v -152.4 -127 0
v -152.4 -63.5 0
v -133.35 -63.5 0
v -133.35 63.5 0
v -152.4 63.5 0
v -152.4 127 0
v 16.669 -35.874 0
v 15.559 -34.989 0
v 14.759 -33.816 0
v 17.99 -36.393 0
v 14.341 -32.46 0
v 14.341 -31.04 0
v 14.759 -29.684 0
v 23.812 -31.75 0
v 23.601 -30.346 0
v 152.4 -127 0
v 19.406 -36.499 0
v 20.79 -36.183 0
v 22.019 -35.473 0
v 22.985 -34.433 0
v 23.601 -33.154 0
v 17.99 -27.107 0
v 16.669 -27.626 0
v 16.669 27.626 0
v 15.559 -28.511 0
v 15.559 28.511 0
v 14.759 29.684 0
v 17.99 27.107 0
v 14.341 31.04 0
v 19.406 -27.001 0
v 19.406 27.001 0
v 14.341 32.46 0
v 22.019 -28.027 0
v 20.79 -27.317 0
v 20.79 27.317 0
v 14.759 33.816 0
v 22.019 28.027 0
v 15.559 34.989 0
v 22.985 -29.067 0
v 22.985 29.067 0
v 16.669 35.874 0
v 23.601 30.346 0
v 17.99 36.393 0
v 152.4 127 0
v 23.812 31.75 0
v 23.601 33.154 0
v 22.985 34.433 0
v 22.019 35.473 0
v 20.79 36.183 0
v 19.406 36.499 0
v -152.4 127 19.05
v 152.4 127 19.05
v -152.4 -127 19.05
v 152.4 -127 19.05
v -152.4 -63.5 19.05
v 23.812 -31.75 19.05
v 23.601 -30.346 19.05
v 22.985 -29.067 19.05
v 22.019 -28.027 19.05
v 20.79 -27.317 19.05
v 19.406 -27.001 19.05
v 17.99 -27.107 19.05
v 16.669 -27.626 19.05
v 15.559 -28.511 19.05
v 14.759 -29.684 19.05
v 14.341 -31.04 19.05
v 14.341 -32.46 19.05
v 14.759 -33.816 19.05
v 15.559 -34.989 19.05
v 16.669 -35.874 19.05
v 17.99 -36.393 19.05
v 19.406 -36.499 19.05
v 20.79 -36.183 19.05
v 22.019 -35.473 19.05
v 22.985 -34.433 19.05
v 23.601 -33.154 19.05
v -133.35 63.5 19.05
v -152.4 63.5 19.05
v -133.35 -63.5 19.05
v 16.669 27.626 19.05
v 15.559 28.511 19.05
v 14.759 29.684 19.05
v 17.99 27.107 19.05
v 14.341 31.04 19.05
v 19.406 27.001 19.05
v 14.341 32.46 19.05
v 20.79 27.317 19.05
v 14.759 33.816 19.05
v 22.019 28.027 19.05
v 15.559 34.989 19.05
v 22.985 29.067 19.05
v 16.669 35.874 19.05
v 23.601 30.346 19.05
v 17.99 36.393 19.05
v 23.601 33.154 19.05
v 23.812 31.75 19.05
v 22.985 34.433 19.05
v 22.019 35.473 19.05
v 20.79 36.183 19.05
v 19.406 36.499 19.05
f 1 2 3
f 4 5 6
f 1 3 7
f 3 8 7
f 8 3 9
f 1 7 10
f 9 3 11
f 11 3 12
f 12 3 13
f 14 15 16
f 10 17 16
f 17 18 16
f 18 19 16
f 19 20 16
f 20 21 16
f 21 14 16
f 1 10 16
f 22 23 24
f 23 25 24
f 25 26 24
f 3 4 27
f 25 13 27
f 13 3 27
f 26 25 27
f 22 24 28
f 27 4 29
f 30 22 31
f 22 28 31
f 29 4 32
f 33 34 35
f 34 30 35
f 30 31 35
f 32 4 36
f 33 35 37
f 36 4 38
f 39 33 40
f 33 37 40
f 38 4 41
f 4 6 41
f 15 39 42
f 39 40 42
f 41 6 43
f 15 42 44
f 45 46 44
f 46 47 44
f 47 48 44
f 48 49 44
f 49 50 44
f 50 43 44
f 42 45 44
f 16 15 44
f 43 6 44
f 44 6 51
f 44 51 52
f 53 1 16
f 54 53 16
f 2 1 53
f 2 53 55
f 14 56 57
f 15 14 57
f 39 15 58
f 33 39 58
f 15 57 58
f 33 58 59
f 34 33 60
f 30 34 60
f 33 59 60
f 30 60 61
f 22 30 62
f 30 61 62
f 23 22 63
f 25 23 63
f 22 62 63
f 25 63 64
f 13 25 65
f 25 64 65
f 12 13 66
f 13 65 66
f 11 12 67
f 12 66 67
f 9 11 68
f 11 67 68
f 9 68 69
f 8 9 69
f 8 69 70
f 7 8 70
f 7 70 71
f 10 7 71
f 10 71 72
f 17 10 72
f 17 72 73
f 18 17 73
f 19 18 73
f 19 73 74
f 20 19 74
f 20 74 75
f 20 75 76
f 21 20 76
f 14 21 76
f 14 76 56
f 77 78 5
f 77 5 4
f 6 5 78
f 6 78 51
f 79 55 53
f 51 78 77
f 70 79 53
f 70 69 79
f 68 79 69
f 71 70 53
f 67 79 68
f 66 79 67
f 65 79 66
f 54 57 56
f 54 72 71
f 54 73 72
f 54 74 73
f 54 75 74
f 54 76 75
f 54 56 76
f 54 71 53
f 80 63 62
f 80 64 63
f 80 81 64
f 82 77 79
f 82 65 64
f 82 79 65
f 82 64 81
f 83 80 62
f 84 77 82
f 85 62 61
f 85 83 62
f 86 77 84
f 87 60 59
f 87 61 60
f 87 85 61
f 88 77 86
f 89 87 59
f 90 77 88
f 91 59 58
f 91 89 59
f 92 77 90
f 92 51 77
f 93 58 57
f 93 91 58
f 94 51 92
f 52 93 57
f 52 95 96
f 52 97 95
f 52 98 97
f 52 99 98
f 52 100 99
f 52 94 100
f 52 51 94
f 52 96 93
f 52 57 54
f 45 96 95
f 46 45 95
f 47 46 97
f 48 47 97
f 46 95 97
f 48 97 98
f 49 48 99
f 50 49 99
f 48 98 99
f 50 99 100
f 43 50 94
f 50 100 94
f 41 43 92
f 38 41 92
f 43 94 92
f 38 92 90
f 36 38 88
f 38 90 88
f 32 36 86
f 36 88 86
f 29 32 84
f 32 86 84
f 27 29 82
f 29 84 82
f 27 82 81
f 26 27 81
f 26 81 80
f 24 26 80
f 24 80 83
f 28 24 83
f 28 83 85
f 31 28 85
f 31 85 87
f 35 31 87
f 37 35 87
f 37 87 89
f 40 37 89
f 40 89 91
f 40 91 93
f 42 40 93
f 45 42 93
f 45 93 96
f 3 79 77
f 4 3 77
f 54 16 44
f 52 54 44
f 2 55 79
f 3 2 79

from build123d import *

# Parameters (mm, degrees)
F0_W     = 304.8
F0_H     = 254
F1_DEPTH = 19.05
F2_W     = 38.1
F2_H     = 127
F3_DEPTH = 19.051
F4_R     = 4.7625
F5_DEPTH = 19.051


with BuildPart() as f1:
    # F0 (on Top) → F1 (new body)
    with BuildSketch(Plane.XY):
        Rectangle(F0_W, F0_H)
    extrude(amount=F1_DEPTH)

    # F2 (on face) → F3 (cut, through all)
    with BuildSketch(Plane.XY.offset(19.05)):
        with Locations((-152.4, 0)):
            Rectangle(F2_W, F2_H)
    extrude(amount=-F3_DEPTH, mode=Mode.SUBTRACT)

    # F4 (on face) → F5 (cut, through all)
    with BuildSketch(Plane.XY.offset(19.05)):
        with Locations((19.05, 31.75)):
            Circle(F4_R)
        with Locations((19.05, -31.75)):
            Circle(F4_R)
    extrude(amount=-F5_DEPTH, mode=Mode.SUBTRACT)


solid = f1.part
